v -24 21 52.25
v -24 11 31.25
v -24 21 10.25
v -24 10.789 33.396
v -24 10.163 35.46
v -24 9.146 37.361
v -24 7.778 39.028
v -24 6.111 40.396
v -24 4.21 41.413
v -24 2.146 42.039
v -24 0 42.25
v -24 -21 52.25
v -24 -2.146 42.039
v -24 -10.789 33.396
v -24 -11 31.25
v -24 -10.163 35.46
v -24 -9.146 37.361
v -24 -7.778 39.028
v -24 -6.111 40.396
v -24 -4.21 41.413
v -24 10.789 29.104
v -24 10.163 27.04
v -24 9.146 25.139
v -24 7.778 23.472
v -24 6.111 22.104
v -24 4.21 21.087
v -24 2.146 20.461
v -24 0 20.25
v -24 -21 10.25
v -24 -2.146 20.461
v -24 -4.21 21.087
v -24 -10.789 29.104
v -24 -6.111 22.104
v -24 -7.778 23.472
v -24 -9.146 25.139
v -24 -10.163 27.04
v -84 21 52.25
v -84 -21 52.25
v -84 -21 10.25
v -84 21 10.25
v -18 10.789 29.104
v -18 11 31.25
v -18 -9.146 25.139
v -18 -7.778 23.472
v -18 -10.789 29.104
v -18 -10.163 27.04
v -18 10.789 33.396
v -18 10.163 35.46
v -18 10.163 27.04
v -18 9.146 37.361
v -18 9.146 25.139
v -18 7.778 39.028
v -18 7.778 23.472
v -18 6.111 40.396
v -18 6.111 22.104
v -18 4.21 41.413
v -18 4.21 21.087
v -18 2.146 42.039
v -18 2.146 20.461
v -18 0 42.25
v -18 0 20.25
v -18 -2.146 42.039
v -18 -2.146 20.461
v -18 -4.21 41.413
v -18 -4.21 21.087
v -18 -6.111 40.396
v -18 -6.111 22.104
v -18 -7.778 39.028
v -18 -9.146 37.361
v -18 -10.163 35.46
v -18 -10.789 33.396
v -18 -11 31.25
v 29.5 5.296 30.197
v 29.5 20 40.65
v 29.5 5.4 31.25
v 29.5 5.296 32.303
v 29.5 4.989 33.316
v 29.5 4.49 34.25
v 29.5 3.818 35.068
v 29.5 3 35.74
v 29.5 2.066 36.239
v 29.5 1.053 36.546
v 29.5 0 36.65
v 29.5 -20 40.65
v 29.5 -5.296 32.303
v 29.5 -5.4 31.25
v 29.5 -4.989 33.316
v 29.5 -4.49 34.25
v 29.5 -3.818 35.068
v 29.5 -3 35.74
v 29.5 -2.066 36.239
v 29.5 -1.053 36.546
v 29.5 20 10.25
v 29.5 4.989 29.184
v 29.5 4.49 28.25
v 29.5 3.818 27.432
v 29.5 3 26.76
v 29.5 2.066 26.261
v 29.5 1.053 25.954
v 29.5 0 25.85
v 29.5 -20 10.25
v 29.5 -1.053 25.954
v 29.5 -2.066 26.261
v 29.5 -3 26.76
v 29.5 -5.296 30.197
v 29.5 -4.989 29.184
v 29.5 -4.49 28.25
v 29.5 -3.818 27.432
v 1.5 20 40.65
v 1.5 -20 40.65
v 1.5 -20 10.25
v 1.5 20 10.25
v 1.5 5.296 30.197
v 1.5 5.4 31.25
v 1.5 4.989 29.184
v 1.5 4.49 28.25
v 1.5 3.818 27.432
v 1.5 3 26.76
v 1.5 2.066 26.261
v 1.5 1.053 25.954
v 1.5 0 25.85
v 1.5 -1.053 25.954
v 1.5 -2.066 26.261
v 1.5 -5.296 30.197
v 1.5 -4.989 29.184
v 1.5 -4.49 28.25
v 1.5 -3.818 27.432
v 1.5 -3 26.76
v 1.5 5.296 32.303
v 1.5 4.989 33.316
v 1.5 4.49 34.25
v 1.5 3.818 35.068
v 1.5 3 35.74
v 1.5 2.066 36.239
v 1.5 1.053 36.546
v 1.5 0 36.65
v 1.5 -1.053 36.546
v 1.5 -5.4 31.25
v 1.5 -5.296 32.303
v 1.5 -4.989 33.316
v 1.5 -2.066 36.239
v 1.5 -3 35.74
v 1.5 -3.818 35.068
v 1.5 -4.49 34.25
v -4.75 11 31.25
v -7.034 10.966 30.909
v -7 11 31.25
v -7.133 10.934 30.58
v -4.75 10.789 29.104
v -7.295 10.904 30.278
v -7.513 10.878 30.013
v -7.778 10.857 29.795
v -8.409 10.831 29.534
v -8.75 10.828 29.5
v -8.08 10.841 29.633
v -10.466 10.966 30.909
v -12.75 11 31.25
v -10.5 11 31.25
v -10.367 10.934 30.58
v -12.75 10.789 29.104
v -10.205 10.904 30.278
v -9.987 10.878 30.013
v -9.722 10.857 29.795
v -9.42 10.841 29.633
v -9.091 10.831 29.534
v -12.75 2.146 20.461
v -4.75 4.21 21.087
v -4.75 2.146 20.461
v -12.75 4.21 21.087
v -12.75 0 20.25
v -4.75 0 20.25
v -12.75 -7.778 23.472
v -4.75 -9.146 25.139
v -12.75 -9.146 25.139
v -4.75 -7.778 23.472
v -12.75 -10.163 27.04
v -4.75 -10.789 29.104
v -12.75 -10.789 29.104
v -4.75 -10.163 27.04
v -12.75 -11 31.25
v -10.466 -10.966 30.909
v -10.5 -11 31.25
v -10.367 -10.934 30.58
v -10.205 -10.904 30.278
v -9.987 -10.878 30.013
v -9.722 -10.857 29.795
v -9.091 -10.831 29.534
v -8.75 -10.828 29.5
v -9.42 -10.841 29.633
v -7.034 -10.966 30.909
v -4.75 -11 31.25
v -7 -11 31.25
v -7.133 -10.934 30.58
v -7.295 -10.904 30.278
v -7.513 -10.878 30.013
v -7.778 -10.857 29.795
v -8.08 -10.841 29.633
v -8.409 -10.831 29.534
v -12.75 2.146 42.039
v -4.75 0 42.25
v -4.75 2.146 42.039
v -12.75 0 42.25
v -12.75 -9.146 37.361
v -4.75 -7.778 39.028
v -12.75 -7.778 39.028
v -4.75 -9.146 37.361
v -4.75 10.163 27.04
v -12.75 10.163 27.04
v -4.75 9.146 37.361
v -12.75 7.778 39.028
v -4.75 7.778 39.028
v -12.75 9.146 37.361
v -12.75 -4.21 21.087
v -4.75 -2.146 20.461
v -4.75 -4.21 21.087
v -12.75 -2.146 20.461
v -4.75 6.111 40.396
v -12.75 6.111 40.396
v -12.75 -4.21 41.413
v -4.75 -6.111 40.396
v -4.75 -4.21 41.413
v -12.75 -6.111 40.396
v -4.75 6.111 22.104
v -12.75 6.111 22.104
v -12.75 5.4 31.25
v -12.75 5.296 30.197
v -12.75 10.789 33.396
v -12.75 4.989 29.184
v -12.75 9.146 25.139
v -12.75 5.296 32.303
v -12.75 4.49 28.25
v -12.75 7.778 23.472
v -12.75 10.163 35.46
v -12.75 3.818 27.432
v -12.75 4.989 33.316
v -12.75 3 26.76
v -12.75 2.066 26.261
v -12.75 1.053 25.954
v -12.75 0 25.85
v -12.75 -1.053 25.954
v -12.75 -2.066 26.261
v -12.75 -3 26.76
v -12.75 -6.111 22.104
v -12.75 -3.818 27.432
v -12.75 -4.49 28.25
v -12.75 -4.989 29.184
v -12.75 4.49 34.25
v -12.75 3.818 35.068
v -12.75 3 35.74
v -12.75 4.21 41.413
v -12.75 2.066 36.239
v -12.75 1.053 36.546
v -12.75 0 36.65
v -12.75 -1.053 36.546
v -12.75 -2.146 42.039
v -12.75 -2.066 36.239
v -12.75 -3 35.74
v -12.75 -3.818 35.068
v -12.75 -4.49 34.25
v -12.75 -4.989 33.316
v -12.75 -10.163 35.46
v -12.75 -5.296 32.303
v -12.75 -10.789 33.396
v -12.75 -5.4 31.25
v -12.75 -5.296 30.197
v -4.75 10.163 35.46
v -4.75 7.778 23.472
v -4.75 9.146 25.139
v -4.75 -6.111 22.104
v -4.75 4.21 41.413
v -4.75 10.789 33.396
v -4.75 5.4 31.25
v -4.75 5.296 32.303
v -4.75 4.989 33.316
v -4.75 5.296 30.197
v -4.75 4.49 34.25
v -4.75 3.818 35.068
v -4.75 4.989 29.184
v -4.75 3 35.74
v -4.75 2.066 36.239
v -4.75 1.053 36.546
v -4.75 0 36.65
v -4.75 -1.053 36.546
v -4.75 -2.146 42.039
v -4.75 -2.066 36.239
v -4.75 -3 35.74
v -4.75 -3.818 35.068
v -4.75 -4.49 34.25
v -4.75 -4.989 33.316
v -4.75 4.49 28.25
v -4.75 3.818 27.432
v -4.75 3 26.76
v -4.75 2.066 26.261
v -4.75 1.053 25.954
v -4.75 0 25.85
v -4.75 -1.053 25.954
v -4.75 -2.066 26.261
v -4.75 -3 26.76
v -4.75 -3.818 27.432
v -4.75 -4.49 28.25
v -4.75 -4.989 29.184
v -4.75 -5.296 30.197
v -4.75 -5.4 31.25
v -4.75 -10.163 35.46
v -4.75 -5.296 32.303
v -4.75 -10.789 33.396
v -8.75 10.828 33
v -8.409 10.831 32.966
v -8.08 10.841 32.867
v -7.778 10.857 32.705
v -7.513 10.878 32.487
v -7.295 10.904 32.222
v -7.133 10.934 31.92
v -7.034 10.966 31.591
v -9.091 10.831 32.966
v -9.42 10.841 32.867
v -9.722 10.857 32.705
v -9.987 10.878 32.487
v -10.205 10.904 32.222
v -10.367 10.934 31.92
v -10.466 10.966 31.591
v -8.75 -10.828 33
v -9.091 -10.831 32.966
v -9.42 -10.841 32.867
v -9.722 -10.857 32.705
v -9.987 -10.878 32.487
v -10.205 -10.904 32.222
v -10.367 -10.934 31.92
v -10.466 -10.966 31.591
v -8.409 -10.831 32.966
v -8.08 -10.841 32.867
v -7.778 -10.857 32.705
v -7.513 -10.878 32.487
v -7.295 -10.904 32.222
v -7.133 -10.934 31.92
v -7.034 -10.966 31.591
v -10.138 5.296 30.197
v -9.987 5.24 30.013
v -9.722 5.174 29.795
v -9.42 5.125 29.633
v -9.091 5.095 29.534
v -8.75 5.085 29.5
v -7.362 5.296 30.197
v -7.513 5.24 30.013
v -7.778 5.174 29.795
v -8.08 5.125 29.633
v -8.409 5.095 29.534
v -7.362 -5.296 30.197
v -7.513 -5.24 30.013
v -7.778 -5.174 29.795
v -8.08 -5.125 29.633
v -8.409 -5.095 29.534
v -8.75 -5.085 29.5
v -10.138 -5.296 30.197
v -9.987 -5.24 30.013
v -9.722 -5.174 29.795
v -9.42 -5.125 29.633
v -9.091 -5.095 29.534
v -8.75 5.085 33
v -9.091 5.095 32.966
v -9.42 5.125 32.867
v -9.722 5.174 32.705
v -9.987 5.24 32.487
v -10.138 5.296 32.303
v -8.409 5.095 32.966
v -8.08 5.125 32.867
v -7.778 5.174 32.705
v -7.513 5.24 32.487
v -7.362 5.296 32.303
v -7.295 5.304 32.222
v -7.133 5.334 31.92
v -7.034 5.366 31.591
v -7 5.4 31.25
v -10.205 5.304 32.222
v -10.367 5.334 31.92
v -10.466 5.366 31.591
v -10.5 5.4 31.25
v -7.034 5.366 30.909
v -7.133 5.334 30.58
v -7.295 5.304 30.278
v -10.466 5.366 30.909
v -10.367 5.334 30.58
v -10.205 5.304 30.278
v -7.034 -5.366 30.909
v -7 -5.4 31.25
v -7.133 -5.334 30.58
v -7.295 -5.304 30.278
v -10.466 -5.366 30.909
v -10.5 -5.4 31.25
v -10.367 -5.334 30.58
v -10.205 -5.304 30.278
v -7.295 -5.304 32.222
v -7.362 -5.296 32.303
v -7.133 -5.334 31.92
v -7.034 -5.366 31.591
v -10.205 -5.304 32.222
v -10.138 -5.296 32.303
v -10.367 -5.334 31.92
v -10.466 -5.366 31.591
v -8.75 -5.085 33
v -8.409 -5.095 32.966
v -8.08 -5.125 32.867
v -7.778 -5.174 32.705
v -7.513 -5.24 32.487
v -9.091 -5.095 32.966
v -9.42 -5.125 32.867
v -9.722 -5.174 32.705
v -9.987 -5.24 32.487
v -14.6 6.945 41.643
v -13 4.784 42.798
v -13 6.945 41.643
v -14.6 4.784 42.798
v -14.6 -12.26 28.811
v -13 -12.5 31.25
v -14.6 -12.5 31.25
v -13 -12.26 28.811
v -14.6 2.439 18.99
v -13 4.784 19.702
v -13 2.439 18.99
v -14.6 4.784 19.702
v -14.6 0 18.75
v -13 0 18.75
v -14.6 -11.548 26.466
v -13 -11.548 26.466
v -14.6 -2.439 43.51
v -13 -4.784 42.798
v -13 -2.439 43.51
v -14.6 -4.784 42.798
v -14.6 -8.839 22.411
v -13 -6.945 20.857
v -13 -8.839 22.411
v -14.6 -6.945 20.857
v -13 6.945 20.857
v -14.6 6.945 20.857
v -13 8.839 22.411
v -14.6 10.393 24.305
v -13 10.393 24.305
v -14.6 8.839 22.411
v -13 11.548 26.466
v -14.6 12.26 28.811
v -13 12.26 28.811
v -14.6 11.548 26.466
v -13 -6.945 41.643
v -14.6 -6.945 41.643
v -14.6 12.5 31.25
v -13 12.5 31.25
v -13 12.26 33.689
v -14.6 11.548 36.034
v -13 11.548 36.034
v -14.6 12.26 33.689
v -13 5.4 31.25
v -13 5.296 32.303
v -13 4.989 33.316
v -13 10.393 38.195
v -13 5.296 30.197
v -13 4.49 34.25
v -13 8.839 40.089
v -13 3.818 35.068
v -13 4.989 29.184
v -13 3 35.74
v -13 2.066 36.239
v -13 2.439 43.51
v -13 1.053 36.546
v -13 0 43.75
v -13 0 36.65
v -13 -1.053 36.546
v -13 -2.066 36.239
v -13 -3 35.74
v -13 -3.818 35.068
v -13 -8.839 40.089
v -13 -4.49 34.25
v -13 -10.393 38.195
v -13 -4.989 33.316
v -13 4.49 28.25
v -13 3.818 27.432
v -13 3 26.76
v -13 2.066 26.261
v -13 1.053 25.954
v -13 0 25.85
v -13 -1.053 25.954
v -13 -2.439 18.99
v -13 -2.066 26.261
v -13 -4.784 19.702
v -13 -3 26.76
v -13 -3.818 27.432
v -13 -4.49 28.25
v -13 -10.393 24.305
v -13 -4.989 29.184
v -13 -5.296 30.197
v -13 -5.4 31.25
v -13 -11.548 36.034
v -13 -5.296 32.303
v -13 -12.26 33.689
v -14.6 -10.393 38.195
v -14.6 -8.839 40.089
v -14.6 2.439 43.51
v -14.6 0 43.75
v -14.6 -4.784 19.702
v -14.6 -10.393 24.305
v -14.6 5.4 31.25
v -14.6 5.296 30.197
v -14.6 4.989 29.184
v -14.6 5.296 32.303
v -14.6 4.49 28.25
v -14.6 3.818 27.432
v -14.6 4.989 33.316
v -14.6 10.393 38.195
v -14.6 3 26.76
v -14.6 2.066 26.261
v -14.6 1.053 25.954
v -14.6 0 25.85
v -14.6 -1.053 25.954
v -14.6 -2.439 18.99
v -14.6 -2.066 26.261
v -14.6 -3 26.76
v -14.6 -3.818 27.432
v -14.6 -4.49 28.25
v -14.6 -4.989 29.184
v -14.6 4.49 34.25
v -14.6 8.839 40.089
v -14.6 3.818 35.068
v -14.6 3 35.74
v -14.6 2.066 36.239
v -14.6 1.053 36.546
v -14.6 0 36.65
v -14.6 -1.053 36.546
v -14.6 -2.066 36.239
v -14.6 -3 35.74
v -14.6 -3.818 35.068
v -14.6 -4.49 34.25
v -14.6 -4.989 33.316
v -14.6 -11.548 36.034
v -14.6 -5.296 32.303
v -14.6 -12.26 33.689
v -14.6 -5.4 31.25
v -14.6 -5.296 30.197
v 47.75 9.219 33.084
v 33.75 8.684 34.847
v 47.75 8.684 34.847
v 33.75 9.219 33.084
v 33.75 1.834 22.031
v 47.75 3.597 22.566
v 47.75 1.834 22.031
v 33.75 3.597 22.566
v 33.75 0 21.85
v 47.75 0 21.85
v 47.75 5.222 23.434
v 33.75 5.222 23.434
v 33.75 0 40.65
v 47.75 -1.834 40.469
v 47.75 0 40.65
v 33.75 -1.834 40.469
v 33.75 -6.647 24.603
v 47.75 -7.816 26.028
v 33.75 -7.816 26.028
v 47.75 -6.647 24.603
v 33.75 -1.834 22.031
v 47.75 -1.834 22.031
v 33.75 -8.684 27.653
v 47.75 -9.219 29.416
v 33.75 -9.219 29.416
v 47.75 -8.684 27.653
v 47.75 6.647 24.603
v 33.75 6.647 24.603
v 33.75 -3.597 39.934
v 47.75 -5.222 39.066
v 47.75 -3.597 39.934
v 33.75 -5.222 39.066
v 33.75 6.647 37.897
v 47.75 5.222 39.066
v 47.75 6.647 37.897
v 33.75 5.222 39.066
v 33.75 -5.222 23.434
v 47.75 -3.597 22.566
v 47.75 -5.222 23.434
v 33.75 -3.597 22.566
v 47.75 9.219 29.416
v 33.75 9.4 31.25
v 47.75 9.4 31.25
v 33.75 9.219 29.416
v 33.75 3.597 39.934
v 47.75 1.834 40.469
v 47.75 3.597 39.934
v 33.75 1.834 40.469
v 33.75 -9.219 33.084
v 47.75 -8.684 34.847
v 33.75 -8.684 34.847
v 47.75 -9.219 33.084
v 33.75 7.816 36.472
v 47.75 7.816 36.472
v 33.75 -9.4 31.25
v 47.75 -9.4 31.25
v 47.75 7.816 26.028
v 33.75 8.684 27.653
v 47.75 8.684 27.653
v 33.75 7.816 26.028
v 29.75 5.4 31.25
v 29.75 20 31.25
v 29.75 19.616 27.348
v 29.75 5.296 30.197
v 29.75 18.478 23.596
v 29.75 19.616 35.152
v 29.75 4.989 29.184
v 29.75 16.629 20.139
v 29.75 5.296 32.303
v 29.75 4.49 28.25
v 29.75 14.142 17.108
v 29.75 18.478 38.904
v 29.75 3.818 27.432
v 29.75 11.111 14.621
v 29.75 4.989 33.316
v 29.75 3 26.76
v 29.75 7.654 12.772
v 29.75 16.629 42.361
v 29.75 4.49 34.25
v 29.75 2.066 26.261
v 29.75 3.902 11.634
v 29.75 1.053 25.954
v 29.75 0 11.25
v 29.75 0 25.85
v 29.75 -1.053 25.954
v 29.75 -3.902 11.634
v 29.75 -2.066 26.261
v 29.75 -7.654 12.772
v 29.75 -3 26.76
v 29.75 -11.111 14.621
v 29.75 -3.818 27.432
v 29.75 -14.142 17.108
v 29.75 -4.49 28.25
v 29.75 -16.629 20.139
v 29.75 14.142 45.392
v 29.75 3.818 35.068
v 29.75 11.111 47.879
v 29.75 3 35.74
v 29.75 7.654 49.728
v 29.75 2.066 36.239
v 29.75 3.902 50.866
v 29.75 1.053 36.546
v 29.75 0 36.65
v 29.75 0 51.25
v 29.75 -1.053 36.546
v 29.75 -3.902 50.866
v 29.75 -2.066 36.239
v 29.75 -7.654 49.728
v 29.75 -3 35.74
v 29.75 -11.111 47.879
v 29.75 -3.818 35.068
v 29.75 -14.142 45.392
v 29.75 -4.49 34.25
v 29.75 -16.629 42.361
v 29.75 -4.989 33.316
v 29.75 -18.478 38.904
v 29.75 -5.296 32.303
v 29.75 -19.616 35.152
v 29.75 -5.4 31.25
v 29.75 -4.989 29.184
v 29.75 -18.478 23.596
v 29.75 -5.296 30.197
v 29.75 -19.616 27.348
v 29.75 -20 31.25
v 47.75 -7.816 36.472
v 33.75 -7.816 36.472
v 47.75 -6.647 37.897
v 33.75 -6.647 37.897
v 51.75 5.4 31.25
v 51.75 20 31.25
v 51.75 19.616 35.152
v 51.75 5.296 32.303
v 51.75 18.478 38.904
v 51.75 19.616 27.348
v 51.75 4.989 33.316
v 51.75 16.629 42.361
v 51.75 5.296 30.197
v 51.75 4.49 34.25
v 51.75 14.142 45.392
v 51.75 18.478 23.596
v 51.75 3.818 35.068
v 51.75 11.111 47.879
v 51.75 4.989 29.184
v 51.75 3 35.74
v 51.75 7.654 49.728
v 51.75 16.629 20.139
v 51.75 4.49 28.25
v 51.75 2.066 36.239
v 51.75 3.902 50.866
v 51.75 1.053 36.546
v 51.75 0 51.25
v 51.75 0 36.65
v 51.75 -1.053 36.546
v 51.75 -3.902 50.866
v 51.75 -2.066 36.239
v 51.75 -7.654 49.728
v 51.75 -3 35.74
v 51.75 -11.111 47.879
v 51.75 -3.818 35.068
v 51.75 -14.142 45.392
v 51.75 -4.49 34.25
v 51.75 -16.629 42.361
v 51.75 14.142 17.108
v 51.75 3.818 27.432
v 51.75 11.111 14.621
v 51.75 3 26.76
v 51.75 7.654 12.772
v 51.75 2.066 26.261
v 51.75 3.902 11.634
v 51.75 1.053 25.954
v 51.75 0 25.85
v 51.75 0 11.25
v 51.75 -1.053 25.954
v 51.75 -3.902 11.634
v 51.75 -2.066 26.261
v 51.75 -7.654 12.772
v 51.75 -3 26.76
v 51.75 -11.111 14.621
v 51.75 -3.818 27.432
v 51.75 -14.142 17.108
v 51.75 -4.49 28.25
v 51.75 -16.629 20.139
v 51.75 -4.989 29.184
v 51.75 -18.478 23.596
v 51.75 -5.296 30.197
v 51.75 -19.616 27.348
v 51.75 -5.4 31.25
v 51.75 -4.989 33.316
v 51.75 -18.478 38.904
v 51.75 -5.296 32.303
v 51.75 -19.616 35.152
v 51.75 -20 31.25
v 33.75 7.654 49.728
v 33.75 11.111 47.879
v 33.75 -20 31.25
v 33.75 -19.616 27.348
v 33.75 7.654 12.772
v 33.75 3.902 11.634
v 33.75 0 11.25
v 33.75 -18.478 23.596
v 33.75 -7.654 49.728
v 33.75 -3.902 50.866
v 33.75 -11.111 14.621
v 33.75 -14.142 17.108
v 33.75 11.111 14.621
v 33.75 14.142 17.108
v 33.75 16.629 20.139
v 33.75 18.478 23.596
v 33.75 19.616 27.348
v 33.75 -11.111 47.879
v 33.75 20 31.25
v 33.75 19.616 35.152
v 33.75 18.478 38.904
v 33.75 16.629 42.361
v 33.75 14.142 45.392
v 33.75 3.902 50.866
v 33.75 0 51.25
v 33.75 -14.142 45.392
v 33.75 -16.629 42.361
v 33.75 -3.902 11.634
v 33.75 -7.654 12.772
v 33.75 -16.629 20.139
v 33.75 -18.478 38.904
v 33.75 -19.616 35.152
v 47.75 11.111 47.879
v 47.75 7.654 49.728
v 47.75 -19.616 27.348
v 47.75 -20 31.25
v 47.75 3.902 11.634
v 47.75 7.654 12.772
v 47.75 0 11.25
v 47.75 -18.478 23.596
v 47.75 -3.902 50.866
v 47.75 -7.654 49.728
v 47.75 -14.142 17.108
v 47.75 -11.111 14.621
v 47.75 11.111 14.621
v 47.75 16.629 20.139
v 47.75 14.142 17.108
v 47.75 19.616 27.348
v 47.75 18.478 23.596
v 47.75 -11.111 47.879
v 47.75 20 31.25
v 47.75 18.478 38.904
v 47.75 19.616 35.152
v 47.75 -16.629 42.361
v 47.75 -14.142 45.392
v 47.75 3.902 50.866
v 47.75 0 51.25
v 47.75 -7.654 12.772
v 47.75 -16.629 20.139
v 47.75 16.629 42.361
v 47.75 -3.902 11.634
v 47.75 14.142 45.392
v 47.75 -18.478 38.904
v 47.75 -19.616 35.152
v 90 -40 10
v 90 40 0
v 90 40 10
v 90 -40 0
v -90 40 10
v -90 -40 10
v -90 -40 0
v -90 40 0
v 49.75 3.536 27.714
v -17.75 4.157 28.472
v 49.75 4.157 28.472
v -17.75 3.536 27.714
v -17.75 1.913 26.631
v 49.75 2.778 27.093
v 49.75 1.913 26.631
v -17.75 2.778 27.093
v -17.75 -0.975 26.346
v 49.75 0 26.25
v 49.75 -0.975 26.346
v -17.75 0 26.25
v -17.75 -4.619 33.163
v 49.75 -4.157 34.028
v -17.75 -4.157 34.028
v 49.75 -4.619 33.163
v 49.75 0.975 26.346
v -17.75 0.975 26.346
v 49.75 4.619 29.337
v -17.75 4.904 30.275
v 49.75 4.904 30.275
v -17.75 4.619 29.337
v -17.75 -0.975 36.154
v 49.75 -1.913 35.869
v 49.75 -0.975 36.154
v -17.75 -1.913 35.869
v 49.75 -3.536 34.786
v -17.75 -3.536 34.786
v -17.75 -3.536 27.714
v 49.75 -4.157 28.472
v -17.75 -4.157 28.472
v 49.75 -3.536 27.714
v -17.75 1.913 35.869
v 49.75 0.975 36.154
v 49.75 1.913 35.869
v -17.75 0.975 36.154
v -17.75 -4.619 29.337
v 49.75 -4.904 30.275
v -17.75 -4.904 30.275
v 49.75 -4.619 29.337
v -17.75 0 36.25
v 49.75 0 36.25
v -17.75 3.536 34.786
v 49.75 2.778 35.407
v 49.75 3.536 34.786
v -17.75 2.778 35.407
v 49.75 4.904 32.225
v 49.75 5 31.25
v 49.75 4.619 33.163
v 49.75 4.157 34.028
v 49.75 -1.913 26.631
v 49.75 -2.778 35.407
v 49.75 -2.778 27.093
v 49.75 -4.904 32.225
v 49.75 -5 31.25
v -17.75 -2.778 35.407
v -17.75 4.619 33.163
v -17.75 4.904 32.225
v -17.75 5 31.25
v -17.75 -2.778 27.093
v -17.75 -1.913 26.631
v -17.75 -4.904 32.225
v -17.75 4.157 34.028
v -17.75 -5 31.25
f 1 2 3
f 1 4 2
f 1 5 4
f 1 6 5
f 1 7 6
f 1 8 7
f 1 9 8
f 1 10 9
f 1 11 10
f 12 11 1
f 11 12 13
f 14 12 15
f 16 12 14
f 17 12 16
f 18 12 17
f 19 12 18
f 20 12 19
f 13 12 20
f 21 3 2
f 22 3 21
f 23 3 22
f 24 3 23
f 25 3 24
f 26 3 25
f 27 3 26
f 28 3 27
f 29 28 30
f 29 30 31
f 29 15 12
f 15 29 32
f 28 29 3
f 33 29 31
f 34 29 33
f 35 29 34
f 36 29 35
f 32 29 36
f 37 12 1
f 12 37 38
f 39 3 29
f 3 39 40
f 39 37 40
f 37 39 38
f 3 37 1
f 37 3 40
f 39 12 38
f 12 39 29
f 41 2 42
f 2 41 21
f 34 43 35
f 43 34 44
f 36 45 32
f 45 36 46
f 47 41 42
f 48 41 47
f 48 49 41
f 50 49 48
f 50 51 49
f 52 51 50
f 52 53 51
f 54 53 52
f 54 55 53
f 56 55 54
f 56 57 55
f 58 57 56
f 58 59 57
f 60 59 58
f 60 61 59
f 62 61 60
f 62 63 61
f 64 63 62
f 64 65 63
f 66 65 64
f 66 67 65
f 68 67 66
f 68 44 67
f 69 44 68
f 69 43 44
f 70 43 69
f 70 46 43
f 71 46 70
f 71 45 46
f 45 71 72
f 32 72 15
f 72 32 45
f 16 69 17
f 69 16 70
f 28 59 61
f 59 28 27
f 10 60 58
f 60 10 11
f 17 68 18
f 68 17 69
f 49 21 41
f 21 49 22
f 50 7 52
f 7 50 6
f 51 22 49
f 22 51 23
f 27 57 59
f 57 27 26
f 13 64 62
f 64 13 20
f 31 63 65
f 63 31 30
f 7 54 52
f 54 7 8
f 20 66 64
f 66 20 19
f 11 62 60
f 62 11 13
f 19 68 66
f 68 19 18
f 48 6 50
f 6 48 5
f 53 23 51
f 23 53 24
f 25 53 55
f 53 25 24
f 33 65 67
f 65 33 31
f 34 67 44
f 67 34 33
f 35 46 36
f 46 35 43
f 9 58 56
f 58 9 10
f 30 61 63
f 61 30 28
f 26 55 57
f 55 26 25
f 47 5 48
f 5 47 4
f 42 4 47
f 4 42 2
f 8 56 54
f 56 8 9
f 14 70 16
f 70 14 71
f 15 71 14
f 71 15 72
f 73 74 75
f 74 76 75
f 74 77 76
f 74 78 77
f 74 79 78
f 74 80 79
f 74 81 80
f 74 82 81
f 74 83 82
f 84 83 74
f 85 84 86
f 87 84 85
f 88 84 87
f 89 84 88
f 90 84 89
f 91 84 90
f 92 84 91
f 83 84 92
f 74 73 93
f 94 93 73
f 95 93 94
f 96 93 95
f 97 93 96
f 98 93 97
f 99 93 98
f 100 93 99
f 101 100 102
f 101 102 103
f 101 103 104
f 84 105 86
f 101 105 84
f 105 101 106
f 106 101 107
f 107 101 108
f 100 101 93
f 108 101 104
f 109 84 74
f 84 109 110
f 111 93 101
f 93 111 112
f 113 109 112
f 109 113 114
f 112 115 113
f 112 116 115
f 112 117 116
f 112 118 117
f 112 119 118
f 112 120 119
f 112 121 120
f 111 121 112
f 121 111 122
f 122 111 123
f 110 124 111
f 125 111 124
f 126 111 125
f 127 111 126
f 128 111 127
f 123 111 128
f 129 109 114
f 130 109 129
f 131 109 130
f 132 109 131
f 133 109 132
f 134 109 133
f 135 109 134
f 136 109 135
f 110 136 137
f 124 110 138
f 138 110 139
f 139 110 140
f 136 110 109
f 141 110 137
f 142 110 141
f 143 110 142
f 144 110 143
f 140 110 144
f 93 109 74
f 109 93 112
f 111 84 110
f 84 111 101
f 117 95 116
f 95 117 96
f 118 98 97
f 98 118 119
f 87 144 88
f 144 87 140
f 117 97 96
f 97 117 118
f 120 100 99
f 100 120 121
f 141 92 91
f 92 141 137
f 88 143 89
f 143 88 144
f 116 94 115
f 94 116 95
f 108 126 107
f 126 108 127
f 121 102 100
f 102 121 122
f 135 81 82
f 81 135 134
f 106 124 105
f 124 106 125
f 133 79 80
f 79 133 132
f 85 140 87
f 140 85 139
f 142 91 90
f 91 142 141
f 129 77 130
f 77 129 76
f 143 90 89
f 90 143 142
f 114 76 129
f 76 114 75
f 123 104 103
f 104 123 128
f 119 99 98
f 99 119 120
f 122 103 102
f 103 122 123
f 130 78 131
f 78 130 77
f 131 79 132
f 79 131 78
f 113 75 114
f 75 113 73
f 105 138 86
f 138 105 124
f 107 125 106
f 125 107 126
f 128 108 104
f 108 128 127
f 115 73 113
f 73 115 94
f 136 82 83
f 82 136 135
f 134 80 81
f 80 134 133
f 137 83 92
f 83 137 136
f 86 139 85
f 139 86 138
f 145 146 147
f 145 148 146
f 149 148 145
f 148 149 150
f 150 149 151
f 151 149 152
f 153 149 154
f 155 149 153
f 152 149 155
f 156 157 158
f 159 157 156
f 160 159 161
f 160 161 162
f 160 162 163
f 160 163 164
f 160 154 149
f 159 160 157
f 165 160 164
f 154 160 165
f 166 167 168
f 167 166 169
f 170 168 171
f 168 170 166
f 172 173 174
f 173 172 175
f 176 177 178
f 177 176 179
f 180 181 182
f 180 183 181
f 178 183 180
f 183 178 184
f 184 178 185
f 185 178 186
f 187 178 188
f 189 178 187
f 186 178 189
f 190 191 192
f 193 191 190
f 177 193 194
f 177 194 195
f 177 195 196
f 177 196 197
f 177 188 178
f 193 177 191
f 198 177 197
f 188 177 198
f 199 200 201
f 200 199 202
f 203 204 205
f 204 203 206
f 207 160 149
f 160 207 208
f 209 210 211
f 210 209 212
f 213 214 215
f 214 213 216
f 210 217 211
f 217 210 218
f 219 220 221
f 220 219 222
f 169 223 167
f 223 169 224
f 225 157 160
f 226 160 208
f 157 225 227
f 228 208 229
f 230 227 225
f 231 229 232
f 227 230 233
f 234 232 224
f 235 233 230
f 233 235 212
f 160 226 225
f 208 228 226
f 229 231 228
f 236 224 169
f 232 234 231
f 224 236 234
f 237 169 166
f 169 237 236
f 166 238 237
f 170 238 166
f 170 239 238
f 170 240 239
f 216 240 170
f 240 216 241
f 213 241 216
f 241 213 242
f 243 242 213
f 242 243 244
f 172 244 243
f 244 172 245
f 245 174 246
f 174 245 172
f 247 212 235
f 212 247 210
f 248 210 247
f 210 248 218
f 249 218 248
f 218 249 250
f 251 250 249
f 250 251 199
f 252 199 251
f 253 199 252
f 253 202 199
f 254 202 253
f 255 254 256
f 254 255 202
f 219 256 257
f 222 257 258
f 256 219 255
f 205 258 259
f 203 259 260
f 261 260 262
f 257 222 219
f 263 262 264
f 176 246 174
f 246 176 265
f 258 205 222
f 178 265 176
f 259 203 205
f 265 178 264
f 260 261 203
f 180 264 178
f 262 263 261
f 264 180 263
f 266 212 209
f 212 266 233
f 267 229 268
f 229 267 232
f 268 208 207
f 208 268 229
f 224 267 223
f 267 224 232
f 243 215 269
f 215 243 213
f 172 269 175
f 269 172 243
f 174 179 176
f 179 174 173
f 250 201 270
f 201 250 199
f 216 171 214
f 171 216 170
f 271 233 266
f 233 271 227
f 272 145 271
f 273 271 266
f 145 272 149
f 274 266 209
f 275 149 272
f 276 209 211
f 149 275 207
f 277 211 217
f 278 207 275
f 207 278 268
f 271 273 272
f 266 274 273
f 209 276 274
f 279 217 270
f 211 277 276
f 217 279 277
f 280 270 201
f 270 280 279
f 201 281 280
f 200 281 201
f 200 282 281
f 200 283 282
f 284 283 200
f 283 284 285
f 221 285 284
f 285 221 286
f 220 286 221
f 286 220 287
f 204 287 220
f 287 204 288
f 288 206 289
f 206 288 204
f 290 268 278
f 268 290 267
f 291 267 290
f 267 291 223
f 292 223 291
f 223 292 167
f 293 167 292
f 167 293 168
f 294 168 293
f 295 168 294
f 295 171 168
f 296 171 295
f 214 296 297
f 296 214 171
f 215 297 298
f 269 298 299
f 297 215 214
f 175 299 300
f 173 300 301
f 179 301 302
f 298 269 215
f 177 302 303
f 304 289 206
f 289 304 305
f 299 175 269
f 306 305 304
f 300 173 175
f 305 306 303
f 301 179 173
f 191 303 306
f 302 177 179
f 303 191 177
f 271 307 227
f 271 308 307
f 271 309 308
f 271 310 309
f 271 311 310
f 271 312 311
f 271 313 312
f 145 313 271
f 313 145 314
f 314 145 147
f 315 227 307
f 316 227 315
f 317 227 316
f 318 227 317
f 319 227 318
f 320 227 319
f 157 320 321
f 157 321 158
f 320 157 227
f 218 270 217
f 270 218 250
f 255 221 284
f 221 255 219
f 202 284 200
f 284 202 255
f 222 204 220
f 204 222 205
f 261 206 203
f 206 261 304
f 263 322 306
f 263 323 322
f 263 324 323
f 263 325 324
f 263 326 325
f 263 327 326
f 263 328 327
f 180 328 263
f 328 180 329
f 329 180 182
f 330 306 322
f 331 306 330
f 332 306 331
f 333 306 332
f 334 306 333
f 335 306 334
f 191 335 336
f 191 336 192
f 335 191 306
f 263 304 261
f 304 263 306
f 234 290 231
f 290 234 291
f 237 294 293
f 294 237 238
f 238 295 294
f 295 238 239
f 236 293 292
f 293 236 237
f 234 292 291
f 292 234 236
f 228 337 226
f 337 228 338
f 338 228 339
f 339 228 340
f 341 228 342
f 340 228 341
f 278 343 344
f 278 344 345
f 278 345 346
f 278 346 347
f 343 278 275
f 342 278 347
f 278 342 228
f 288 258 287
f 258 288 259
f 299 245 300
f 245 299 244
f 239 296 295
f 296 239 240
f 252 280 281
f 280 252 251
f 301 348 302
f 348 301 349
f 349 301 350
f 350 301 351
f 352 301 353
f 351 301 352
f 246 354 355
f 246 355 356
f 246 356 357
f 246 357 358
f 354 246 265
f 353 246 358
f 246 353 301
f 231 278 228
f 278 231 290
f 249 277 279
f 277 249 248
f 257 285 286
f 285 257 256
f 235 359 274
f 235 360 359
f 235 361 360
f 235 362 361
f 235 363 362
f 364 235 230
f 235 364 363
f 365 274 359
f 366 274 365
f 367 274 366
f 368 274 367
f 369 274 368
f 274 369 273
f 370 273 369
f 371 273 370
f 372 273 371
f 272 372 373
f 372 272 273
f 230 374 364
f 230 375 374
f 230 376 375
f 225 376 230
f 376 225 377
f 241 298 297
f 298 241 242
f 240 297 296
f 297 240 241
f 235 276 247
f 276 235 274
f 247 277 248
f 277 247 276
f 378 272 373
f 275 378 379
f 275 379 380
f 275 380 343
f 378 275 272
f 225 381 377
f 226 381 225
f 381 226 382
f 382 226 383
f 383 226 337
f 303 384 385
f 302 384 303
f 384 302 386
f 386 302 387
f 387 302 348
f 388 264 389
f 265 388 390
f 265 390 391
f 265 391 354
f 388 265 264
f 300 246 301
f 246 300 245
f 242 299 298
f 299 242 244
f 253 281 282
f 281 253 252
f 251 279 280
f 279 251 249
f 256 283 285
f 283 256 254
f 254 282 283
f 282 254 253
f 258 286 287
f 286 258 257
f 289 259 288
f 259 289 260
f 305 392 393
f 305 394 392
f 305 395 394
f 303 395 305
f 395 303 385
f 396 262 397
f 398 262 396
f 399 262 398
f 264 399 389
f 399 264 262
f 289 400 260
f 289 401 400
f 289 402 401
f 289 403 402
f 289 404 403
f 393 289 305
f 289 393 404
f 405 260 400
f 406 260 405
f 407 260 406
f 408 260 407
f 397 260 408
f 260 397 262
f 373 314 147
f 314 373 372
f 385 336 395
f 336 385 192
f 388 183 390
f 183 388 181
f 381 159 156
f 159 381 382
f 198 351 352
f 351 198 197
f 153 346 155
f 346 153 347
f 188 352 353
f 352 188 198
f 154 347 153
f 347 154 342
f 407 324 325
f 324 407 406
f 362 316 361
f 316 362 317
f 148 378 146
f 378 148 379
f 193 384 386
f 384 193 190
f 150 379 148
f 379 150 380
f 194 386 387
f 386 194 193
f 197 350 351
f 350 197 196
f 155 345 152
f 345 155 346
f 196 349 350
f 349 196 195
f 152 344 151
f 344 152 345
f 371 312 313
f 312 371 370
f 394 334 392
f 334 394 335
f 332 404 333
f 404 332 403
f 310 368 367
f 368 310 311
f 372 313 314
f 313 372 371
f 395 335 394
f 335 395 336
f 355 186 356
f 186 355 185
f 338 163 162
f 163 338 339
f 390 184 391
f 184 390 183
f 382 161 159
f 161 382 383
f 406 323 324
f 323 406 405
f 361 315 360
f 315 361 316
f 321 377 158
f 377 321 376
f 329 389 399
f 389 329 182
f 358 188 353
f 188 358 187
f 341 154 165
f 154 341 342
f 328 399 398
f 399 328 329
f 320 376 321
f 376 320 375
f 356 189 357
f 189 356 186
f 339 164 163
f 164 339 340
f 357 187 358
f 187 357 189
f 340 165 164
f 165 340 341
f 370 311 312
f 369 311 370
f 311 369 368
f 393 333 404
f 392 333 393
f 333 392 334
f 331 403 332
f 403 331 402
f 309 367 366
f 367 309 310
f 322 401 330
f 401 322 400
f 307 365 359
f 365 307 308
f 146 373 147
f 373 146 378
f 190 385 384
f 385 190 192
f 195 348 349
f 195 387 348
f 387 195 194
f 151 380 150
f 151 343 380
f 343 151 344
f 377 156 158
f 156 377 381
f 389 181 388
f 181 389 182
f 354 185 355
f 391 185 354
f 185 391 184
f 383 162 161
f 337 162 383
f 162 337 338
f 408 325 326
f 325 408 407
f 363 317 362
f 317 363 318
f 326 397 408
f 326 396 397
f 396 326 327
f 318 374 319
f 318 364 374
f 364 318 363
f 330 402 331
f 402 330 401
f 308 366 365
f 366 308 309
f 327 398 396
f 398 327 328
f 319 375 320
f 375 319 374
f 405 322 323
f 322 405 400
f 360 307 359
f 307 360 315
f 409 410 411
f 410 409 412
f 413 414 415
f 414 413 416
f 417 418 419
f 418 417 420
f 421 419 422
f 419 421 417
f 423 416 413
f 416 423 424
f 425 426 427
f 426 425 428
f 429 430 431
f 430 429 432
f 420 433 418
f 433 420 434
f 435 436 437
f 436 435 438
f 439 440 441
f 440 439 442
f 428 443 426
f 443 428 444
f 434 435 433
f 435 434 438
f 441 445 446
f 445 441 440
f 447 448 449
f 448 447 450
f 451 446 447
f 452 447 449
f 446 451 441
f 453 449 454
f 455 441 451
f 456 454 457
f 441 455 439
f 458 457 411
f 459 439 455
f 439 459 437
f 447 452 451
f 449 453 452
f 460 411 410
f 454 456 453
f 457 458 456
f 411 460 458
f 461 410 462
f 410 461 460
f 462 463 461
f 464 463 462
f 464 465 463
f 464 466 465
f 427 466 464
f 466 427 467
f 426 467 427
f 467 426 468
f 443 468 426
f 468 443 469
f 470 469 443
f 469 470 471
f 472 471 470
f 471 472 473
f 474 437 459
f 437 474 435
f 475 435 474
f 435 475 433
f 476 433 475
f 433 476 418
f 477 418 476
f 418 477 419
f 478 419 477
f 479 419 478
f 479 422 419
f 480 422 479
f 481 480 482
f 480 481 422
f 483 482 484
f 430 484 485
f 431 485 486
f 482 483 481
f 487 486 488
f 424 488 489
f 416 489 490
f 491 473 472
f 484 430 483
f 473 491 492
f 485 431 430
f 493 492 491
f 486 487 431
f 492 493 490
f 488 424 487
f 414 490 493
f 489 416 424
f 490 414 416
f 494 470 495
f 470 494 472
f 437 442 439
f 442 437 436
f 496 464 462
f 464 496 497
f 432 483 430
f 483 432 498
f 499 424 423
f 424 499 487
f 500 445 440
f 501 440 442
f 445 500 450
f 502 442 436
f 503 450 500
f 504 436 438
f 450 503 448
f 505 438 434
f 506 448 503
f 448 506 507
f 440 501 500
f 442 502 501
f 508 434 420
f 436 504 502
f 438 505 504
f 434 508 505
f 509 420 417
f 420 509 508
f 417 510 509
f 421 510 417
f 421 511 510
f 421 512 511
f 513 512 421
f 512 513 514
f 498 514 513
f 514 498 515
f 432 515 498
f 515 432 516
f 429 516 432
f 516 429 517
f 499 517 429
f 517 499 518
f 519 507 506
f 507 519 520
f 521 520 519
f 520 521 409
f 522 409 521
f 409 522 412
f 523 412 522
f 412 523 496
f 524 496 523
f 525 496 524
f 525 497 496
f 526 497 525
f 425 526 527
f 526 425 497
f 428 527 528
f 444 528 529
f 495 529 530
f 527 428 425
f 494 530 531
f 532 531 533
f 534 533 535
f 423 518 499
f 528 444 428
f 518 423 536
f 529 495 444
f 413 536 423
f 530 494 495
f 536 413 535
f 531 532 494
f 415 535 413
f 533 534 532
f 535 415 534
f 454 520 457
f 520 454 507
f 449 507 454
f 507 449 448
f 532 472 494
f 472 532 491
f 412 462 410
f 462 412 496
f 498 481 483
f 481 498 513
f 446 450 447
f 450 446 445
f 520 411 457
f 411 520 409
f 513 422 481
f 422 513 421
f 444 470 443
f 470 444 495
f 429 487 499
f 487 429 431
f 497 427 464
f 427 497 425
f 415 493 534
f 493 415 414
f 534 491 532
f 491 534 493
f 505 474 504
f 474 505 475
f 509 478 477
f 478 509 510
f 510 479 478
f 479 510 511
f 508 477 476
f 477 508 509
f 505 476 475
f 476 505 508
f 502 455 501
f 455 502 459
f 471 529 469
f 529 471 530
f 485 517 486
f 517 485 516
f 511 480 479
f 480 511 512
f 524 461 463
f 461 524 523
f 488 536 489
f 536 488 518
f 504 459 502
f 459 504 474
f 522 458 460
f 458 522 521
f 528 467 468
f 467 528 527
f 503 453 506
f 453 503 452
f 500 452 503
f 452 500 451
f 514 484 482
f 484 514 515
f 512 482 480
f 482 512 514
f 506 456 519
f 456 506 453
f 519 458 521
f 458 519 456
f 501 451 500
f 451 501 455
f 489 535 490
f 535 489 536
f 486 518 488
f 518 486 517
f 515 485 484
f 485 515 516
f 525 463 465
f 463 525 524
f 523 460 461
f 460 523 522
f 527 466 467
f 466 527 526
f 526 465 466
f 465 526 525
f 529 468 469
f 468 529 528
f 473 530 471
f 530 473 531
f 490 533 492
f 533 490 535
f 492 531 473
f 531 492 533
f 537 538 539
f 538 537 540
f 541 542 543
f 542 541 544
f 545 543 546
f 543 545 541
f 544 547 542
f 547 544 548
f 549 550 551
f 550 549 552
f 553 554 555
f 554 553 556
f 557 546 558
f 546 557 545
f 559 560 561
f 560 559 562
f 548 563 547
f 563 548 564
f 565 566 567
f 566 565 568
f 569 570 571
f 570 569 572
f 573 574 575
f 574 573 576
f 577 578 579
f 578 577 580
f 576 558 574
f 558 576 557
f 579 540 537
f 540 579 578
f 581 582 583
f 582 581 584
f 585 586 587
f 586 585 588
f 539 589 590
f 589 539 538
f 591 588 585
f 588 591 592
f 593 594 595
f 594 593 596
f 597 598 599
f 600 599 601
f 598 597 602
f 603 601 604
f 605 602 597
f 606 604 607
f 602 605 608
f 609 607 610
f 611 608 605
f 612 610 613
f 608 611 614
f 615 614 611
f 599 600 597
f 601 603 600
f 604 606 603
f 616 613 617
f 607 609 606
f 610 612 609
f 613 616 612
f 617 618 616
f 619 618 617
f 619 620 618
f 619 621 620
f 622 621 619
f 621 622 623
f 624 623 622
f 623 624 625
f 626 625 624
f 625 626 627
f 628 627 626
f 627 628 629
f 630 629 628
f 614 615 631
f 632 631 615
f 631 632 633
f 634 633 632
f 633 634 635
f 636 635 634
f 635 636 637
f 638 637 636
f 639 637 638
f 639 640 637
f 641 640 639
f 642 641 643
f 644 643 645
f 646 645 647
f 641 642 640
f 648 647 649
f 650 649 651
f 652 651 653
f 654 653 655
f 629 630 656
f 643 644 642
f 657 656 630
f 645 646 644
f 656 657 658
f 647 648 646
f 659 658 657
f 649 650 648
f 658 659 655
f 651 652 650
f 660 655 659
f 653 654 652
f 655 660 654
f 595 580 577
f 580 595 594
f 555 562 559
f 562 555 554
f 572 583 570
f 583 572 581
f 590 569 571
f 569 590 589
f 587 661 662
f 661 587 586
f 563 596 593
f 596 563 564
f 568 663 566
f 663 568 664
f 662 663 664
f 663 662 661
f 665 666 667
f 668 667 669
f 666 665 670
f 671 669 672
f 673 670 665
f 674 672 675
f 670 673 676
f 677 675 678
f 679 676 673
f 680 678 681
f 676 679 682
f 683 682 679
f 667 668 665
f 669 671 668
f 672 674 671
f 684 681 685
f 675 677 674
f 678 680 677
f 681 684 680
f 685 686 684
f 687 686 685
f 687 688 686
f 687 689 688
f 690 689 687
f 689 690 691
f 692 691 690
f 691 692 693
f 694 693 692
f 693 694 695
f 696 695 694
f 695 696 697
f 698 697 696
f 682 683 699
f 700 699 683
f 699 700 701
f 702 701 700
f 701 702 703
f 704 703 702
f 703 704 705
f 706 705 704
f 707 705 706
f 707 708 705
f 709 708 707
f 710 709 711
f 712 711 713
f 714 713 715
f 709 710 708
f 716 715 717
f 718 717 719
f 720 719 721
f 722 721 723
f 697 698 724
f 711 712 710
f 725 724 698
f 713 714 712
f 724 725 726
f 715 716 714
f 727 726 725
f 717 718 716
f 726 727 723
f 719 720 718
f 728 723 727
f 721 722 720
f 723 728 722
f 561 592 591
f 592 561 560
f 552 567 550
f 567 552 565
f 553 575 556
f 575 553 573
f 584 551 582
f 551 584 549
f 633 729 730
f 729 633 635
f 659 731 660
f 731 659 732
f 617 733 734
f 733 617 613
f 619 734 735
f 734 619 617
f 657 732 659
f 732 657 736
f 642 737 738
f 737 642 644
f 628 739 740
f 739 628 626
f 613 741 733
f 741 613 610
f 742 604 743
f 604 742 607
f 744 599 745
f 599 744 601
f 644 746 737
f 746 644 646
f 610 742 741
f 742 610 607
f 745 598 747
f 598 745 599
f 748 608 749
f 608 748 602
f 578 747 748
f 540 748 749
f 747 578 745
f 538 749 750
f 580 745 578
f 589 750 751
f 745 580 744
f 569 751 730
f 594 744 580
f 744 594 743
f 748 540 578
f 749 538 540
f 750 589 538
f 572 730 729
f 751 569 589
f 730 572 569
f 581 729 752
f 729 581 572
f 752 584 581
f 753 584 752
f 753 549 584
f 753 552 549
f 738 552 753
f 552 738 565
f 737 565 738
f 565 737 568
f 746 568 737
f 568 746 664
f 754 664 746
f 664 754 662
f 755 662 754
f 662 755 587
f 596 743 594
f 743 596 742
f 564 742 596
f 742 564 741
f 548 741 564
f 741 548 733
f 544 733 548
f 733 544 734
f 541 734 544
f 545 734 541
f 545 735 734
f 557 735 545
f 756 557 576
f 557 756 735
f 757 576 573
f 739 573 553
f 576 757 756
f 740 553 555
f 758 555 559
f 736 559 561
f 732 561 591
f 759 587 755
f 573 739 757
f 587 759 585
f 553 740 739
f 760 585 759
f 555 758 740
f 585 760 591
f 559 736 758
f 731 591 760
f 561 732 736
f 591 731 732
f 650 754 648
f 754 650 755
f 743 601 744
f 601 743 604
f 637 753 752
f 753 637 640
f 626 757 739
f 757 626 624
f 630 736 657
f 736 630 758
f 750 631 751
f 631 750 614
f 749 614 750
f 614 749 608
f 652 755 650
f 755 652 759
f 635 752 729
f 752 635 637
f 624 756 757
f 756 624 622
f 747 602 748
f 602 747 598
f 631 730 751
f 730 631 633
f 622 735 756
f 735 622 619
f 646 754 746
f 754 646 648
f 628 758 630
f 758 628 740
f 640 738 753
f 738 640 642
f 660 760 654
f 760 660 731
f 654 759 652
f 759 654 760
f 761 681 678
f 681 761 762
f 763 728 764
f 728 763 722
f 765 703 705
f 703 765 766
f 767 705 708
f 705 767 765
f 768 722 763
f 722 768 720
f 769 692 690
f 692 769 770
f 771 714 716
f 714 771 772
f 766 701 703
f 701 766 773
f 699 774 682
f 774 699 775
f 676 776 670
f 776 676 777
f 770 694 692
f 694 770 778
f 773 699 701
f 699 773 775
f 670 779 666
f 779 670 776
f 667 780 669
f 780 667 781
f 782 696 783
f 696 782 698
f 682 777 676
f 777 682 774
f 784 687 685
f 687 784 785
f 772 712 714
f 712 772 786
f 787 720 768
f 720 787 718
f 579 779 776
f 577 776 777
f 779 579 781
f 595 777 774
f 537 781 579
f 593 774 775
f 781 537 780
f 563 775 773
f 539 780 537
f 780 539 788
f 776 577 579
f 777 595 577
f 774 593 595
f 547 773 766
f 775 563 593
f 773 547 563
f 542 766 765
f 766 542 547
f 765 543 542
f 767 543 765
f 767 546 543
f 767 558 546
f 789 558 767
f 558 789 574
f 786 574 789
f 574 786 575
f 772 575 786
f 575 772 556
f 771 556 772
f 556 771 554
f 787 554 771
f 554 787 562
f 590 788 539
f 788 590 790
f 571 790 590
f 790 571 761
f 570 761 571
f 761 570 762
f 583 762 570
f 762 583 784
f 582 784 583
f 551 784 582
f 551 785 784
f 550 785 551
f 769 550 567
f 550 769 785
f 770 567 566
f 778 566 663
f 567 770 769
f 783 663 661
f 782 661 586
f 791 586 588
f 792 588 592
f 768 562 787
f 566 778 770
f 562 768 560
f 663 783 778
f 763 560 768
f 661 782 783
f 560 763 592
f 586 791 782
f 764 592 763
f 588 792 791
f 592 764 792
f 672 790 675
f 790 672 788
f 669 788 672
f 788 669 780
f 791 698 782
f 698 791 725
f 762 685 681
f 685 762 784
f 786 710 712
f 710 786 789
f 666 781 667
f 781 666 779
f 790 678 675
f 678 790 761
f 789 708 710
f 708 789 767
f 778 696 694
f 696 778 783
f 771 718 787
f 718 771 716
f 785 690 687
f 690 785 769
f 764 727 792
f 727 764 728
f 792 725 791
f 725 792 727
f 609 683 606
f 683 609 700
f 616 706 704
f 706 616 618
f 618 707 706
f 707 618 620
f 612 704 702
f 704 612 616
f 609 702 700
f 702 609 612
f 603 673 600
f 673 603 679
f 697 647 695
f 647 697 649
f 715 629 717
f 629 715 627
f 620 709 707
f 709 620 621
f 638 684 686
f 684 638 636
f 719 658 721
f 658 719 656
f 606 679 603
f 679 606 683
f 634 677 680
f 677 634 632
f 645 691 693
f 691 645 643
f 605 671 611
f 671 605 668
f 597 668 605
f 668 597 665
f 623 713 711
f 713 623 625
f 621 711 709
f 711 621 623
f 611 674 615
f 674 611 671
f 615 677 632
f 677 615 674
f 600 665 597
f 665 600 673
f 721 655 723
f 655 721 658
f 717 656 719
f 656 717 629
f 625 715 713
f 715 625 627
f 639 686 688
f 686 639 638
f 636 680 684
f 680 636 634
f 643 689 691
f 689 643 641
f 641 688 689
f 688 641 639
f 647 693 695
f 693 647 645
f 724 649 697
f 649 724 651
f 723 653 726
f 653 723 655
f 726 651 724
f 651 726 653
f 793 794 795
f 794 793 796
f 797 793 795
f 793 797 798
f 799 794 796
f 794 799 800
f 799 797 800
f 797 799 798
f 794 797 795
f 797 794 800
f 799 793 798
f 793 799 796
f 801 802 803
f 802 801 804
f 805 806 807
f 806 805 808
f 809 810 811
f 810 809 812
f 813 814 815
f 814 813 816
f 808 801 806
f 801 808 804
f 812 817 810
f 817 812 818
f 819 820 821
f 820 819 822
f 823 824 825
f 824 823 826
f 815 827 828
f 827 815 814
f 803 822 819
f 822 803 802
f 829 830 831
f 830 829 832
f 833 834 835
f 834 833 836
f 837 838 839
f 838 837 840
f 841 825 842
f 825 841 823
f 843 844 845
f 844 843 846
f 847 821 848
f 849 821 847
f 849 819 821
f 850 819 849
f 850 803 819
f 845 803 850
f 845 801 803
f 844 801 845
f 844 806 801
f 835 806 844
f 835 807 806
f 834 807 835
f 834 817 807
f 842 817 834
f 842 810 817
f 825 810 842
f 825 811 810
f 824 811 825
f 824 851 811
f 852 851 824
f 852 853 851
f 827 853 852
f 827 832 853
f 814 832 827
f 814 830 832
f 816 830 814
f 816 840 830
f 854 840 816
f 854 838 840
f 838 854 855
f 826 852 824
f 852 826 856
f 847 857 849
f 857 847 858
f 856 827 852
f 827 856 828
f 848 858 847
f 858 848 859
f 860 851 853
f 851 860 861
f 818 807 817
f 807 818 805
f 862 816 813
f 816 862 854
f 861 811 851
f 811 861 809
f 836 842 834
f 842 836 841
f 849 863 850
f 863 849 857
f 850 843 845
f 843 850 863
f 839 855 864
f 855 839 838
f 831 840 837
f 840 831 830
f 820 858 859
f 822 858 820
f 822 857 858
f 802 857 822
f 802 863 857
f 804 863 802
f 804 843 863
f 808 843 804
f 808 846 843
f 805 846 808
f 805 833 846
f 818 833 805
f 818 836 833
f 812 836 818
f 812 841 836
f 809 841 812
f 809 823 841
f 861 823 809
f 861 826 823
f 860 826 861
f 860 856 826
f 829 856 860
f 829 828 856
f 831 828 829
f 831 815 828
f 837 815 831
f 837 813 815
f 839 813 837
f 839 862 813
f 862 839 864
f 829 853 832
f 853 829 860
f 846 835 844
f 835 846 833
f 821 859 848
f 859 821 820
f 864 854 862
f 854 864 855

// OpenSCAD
$fn = 32;

// ------------------------------------------------------------------------
// Motor drive station: motor 60 x 42 mm, shaft d10, pulley d40
// Every part is its own module, assembly() places every instance.
// ------------------------------------------------------------------------

// --- part 1 ---
module station_bed() {
  difference() {
    translate([-90, -40, 0]) cube([180, 80, 10]);
  }
}

// --- part 2 ---
module drive_motor() {
  union() {
    translate([-30, -21, 0]) cube([60, 42, 42]);
    translate([33, 0, 21]) rotate([0, 90, 0]) cylinder(h = 6, d = 22, center = true);
  }
}

// --- part 3 ---
module pillow_block() {
  difference() {
    translate([-14, -20, 0]) cube([28, 40, 30.4]);
    translate([0, 0, 21]) rotate([0, 90, 0]) cylinder(h = 30, d = 10.8, center = true);
  }
}

// --- part 4 ---
module drive_shaft() {
  translate([0, 0, -33.75]) cylinder(h = 67.5, d = 10);
}

// --- part 5 ---
module shaft_collar() {
  difference() {
    cylinder(h = 8, d = 22);
    translate([0, 0, -1]) cylinder(h = 10, d = 10.8);
    translate([0, 0, 4]) rotate([90, 0, 0]) cylinder(h = 24, d = 3.5, center = true);
  }
}

// --- part 6 ---
module collar_washer() {
  difference() {
      translate([0, 0, 0]) cylinder(h = 1.6, d = 25);
      translate([0, 0, -1]) cylinder(h = 3.6, d = 10.8);
    }
}

// --- part 7 ---
module drive_pulley() {
  difference() {
    union() {
      cylinder(h = 22, d = 18.8);
      cylinder(h = 4, d = 40);
      translate([0, 0, 18]) cylinder(h = 4, d = 40);
    }
    translate([0, 0, -1]) cylinder(h = 24, d = 10.8);
  }
}

// --- assembly ---
module assembly() {
  color([0.80, 0.24, 0.20]) translate([0, 0, 0]) rotate([0, 0, 0]) station_bed();
  color([0.20, 0.45, 0.75]) translate([-54, 0, 10.25]) rotate([0, 0, 0]) drive_motor();
  color([0.25, 0.62, 0.32]) translate([15.5, 0, 10.25]) rotate([0, 0, 0]) pillow_block();
  color([0.92, 0.70, 0.18]) translate([16, 0, 31.25]) rotate([0, 90, 0]) drive_shaft();
  color([0.58, 0.35, 0.70]) translate([-12.75, 0, 31.25]) rotate([0, 90, 0]) shaft_collar();
  color([0.16, 0.66, 0.66]) translate([-14.6, 0, 31.25]) rotate([0, 90, 0]) collar_washer();
  color([0.85, 0.48, 0.18]) translate([29.75, 0, 31.25]) rotate([0, 90, 0]) drive_pulley();
}

assembly();
